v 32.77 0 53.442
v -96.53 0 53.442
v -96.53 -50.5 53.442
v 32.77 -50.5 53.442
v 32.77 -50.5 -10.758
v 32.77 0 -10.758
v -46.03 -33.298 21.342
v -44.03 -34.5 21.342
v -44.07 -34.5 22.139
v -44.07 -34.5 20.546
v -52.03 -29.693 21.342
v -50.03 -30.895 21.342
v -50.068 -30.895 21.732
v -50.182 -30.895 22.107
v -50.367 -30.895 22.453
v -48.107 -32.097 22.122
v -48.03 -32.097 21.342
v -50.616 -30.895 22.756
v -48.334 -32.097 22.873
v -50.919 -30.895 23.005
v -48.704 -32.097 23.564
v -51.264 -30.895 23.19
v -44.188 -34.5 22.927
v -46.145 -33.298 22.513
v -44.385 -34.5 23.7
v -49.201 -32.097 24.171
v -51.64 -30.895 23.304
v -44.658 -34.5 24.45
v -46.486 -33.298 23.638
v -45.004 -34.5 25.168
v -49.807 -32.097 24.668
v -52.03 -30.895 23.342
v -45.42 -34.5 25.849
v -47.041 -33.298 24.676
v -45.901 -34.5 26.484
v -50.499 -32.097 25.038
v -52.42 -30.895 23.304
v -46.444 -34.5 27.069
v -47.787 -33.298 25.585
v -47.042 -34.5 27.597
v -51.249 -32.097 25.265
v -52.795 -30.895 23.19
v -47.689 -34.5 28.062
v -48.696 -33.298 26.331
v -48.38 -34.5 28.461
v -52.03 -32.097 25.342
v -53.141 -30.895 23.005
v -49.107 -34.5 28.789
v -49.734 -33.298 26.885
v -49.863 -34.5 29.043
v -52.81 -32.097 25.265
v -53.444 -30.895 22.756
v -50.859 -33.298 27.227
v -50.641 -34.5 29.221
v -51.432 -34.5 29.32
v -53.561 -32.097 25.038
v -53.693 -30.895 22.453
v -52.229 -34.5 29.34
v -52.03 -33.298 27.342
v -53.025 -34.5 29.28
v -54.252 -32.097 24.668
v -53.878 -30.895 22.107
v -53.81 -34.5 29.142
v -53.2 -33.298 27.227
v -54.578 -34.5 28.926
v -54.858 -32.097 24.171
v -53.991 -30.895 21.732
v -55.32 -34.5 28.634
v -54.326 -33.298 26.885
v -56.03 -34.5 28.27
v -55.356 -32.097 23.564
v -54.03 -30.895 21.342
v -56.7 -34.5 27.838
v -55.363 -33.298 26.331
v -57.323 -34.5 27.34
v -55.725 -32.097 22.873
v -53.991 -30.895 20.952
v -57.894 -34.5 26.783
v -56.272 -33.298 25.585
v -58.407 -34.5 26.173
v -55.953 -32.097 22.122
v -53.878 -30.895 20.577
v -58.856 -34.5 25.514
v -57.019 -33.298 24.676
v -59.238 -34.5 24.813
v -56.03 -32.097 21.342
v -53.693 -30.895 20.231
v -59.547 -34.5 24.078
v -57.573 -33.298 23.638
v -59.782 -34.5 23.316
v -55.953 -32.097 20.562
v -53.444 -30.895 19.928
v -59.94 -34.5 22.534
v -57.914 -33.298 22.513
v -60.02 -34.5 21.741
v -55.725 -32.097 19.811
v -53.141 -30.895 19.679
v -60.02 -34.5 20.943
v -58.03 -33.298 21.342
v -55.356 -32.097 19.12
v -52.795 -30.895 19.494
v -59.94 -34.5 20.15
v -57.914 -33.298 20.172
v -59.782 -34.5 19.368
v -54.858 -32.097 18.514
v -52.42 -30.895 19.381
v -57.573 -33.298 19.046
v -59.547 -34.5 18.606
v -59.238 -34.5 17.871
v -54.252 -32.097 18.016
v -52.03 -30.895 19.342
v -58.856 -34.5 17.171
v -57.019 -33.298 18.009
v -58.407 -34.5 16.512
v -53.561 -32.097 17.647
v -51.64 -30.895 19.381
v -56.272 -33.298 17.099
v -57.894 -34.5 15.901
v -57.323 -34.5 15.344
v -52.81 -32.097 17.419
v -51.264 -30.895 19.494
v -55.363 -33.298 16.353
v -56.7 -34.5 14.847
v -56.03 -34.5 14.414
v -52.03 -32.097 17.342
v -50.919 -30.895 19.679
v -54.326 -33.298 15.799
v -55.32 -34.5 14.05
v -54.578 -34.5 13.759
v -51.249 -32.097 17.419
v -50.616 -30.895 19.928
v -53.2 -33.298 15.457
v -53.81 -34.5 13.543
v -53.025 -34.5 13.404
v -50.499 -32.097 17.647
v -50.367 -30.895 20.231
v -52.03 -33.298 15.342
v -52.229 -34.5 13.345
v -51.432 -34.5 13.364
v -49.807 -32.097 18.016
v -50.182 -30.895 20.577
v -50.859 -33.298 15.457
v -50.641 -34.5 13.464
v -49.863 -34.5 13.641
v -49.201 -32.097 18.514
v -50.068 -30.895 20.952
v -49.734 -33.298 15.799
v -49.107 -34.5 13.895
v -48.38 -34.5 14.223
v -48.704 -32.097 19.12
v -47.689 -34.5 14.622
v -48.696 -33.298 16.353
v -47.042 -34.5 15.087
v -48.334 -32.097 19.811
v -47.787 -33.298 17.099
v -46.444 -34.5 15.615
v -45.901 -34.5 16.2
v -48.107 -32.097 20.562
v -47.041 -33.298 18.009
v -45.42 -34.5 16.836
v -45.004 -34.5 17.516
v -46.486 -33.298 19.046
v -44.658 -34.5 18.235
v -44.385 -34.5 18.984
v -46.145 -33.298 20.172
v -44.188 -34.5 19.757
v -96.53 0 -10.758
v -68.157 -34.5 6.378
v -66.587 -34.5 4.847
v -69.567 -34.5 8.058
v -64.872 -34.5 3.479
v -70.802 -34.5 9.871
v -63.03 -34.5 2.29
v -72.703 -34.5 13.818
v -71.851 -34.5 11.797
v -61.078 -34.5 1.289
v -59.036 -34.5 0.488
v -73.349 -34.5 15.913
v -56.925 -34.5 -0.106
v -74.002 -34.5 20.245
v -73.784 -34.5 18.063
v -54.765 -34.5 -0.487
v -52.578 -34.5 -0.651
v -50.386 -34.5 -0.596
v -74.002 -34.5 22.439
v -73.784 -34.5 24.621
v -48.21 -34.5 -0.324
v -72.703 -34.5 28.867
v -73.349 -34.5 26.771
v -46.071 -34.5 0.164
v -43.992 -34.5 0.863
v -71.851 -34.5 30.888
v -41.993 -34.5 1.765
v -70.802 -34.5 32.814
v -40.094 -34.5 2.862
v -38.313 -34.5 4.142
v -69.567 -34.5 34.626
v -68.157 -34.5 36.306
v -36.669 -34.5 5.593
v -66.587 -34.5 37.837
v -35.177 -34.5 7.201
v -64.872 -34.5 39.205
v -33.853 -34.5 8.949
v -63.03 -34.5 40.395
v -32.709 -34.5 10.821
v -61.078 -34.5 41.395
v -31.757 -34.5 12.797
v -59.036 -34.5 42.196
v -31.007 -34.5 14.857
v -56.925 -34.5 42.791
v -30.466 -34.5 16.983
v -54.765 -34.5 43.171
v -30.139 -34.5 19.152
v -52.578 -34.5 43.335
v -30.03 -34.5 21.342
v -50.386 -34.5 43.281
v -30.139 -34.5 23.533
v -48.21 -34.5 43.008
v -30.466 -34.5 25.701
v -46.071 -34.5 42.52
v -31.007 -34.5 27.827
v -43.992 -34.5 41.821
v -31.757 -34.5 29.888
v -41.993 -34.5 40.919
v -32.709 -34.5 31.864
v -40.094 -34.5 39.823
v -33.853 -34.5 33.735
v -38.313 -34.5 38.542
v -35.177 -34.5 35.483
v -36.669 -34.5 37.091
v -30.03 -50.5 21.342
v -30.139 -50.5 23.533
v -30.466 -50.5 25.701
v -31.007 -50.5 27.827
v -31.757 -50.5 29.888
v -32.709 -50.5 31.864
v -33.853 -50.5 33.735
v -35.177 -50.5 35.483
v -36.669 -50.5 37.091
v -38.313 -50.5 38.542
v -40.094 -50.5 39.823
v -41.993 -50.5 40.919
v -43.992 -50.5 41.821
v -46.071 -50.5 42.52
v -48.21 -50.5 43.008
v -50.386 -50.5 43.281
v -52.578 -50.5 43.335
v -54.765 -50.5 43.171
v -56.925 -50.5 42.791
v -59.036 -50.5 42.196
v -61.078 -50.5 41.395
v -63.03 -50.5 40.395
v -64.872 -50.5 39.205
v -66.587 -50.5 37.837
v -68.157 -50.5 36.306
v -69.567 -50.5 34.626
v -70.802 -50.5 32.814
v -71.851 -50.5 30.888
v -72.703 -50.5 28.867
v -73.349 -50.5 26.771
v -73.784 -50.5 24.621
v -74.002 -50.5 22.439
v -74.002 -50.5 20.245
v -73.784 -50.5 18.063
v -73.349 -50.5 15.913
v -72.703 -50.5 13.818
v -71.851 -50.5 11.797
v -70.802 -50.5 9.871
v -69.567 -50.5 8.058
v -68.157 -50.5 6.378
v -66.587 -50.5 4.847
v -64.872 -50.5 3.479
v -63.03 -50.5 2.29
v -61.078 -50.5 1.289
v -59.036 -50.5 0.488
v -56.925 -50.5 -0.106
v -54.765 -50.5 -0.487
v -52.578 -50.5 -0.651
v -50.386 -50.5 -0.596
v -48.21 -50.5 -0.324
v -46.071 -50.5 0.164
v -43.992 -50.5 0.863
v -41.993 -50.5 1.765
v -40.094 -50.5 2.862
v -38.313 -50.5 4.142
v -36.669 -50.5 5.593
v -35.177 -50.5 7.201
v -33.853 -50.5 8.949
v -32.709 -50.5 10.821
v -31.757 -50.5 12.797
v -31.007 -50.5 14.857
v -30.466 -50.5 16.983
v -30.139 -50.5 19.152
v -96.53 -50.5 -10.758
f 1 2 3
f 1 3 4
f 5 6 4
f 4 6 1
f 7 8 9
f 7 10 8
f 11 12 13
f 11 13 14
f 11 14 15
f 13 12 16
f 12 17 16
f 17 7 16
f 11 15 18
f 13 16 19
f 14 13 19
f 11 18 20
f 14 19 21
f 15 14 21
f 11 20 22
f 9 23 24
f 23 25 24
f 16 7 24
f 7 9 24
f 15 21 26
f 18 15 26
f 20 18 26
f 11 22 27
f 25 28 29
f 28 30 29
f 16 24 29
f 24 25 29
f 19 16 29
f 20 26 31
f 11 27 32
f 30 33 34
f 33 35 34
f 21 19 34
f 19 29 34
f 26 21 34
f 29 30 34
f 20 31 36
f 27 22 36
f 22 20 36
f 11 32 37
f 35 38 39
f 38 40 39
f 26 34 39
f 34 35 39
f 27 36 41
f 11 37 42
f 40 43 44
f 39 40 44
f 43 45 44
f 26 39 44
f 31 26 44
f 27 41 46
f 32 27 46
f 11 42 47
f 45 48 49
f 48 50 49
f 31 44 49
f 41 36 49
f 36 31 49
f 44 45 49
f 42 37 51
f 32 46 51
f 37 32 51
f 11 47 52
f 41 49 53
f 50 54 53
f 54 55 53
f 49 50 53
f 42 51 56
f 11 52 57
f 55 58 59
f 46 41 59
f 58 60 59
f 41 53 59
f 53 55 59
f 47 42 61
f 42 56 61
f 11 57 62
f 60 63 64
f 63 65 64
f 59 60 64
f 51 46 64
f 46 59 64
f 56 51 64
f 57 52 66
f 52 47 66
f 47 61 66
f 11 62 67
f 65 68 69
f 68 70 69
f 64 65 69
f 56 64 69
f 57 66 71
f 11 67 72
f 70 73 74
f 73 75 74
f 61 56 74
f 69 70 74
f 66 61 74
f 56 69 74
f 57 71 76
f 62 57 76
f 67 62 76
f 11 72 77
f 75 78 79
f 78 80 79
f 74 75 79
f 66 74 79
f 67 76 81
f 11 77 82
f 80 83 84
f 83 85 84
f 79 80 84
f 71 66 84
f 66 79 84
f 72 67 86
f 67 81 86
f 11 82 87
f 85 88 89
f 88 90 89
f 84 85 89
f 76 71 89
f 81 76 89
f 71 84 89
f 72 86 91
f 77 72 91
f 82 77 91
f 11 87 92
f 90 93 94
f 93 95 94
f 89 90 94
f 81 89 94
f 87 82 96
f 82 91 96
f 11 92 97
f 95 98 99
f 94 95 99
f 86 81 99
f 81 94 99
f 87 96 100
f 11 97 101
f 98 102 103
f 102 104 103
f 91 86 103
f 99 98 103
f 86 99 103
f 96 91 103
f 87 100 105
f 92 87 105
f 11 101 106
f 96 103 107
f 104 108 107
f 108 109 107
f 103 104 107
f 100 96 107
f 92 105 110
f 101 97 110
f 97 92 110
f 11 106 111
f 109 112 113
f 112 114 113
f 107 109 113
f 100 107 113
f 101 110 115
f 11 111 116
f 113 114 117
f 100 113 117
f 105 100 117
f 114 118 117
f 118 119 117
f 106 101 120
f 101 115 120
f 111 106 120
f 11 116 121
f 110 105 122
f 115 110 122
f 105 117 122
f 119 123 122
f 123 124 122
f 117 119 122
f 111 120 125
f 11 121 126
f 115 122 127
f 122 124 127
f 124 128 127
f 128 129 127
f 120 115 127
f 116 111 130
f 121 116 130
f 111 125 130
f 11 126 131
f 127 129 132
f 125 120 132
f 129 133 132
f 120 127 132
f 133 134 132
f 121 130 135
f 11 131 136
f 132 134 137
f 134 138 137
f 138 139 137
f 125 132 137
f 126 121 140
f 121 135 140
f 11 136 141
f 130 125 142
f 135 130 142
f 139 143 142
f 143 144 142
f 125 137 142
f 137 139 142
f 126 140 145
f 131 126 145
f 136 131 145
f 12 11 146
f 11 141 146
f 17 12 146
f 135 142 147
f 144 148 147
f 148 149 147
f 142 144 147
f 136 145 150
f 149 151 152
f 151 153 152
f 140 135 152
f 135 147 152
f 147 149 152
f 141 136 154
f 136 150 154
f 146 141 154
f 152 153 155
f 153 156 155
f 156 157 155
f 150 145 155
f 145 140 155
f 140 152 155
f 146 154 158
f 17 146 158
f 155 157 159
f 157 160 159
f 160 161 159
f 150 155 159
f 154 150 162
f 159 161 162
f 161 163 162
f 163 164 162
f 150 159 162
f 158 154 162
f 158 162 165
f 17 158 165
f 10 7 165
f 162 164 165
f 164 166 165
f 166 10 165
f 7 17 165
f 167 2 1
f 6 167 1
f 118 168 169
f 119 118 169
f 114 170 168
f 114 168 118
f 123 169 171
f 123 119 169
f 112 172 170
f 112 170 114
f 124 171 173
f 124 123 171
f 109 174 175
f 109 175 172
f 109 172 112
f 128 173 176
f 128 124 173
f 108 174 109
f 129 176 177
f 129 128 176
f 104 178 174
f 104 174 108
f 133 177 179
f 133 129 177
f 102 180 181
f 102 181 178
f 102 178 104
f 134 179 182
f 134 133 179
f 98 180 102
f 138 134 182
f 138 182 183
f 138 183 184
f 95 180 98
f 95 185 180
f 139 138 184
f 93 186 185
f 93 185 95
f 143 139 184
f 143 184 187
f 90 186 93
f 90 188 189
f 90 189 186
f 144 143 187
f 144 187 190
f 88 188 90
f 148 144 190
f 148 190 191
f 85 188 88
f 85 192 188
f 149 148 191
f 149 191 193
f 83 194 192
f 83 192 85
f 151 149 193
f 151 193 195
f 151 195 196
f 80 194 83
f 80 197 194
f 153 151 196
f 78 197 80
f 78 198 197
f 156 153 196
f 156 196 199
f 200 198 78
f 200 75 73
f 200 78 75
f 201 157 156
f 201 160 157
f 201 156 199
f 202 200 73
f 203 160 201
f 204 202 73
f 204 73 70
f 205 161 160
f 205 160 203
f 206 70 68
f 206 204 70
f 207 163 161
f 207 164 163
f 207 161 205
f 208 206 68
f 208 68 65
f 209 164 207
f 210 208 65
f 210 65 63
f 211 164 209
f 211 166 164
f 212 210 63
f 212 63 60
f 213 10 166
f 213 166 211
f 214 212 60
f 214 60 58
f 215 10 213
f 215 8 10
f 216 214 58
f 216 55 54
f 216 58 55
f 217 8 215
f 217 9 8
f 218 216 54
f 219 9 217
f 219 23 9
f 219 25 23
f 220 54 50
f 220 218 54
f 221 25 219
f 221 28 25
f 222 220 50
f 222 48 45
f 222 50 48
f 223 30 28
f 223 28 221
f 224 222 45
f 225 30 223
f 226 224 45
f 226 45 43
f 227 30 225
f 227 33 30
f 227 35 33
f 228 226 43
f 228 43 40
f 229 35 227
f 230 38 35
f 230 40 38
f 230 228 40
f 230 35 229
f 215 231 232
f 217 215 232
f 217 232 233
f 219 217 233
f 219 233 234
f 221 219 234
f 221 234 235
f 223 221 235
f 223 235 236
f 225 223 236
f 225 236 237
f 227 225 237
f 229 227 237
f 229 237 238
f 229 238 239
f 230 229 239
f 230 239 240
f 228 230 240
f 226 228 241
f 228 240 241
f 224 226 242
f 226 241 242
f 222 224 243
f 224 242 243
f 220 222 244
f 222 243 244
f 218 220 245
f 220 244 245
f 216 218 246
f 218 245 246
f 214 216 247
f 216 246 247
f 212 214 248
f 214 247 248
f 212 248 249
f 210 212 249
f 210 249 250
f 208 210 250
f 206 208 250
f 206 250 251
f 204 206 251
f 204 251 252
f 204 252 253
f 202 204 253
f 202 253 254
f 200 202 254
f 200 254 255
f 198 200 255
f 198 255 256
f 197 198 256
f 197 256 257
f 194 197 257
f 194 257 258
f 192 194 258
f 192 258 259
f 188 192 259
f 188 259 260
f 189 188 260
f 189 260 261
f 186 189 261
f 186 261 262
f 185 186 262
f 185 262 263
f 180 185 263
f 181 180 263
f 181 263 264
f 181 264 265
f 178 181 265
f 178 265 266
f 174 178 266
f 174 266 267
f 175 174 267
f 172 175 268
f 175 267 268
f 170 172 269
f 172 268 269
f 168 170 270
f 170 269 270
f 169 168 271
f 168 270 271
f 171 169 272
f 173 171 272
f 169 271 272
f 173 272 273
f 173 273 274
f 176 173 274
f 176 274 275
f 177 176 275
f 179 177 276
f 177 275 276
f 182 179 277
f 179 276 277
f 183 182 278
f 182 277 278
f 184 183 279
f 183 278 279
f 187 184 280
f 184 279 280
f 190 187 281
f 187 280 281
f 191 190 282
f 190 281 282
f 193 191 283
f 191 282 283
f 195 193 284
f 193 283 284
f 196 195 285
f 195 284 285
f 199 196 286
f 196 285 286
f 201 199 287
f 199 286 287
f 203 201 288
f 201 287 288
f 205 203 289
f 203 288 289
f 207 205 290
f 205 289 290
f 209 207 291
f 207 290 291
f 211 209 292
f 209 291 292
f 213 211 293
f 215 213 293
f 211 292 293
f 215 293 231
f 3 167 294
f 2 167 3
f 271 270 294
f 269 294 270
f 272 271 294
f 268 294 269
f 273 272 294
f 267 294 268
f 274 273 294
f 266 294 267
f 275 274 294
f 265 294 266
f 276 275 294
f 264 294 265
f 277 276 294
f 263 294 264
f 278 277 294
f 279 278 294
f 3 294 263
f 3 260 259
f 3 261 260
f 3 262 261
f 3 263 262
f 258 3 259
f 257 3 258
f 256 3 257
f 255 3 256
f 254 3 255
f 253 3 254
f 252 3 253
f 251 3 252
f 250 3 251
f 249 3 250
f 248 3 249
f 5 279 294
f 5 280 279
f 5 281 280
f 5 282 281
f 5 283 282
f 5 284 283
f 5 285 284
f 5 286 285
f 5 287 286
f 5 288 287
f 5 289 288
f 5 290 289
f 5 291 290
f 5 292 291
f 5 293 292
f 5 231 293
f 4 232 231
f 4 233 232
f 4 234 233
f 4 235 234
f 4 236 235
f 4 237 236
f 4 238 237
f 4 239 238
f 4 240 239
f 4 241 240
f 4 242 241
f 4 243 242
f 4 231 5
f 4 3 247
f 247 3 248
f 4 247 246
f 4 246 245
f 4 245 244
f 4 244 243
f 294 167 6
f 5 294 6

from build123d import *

# Parameters (mm, degrees)
F0_W           = 129.3
F0_H           = 64.2
F1_DEPTH       = 50.5
F3_D           = 16
F3_DEPTH       = 16
F3_CBORE_D     = 44
F3_CBORE_DEPTH = 16
F3_TIP         = 4.8068849522


with BuildPart() as f1:
    # F0 (on Front) → F1 (new body)
    with BuildSketch(Plane.XZ):
        with Locations((-31.8797686338, 21.3420945689)):
            Rectangle(F0_W, F0_H)
    extrude(amount=F1_DEPTH)

    # F3
    with Locations(Plane.XZ.offset(50.5)):
        with Locations((-52.0297686338, 21.3420945689)):
            CounterBoreHole(F3_D / 2, F3_CBORE_D / 2, F3_CBORE_DEPTH, depth=F3_DEPTH)
            with Locations((0, 0, -(F3_DEPTH + F3_TIP / 2))):  # 118° drill point
                Cone(0, F3_D / 2, F3_TIP, mode=Mode.SUBTRACT)


solid = f1.part
